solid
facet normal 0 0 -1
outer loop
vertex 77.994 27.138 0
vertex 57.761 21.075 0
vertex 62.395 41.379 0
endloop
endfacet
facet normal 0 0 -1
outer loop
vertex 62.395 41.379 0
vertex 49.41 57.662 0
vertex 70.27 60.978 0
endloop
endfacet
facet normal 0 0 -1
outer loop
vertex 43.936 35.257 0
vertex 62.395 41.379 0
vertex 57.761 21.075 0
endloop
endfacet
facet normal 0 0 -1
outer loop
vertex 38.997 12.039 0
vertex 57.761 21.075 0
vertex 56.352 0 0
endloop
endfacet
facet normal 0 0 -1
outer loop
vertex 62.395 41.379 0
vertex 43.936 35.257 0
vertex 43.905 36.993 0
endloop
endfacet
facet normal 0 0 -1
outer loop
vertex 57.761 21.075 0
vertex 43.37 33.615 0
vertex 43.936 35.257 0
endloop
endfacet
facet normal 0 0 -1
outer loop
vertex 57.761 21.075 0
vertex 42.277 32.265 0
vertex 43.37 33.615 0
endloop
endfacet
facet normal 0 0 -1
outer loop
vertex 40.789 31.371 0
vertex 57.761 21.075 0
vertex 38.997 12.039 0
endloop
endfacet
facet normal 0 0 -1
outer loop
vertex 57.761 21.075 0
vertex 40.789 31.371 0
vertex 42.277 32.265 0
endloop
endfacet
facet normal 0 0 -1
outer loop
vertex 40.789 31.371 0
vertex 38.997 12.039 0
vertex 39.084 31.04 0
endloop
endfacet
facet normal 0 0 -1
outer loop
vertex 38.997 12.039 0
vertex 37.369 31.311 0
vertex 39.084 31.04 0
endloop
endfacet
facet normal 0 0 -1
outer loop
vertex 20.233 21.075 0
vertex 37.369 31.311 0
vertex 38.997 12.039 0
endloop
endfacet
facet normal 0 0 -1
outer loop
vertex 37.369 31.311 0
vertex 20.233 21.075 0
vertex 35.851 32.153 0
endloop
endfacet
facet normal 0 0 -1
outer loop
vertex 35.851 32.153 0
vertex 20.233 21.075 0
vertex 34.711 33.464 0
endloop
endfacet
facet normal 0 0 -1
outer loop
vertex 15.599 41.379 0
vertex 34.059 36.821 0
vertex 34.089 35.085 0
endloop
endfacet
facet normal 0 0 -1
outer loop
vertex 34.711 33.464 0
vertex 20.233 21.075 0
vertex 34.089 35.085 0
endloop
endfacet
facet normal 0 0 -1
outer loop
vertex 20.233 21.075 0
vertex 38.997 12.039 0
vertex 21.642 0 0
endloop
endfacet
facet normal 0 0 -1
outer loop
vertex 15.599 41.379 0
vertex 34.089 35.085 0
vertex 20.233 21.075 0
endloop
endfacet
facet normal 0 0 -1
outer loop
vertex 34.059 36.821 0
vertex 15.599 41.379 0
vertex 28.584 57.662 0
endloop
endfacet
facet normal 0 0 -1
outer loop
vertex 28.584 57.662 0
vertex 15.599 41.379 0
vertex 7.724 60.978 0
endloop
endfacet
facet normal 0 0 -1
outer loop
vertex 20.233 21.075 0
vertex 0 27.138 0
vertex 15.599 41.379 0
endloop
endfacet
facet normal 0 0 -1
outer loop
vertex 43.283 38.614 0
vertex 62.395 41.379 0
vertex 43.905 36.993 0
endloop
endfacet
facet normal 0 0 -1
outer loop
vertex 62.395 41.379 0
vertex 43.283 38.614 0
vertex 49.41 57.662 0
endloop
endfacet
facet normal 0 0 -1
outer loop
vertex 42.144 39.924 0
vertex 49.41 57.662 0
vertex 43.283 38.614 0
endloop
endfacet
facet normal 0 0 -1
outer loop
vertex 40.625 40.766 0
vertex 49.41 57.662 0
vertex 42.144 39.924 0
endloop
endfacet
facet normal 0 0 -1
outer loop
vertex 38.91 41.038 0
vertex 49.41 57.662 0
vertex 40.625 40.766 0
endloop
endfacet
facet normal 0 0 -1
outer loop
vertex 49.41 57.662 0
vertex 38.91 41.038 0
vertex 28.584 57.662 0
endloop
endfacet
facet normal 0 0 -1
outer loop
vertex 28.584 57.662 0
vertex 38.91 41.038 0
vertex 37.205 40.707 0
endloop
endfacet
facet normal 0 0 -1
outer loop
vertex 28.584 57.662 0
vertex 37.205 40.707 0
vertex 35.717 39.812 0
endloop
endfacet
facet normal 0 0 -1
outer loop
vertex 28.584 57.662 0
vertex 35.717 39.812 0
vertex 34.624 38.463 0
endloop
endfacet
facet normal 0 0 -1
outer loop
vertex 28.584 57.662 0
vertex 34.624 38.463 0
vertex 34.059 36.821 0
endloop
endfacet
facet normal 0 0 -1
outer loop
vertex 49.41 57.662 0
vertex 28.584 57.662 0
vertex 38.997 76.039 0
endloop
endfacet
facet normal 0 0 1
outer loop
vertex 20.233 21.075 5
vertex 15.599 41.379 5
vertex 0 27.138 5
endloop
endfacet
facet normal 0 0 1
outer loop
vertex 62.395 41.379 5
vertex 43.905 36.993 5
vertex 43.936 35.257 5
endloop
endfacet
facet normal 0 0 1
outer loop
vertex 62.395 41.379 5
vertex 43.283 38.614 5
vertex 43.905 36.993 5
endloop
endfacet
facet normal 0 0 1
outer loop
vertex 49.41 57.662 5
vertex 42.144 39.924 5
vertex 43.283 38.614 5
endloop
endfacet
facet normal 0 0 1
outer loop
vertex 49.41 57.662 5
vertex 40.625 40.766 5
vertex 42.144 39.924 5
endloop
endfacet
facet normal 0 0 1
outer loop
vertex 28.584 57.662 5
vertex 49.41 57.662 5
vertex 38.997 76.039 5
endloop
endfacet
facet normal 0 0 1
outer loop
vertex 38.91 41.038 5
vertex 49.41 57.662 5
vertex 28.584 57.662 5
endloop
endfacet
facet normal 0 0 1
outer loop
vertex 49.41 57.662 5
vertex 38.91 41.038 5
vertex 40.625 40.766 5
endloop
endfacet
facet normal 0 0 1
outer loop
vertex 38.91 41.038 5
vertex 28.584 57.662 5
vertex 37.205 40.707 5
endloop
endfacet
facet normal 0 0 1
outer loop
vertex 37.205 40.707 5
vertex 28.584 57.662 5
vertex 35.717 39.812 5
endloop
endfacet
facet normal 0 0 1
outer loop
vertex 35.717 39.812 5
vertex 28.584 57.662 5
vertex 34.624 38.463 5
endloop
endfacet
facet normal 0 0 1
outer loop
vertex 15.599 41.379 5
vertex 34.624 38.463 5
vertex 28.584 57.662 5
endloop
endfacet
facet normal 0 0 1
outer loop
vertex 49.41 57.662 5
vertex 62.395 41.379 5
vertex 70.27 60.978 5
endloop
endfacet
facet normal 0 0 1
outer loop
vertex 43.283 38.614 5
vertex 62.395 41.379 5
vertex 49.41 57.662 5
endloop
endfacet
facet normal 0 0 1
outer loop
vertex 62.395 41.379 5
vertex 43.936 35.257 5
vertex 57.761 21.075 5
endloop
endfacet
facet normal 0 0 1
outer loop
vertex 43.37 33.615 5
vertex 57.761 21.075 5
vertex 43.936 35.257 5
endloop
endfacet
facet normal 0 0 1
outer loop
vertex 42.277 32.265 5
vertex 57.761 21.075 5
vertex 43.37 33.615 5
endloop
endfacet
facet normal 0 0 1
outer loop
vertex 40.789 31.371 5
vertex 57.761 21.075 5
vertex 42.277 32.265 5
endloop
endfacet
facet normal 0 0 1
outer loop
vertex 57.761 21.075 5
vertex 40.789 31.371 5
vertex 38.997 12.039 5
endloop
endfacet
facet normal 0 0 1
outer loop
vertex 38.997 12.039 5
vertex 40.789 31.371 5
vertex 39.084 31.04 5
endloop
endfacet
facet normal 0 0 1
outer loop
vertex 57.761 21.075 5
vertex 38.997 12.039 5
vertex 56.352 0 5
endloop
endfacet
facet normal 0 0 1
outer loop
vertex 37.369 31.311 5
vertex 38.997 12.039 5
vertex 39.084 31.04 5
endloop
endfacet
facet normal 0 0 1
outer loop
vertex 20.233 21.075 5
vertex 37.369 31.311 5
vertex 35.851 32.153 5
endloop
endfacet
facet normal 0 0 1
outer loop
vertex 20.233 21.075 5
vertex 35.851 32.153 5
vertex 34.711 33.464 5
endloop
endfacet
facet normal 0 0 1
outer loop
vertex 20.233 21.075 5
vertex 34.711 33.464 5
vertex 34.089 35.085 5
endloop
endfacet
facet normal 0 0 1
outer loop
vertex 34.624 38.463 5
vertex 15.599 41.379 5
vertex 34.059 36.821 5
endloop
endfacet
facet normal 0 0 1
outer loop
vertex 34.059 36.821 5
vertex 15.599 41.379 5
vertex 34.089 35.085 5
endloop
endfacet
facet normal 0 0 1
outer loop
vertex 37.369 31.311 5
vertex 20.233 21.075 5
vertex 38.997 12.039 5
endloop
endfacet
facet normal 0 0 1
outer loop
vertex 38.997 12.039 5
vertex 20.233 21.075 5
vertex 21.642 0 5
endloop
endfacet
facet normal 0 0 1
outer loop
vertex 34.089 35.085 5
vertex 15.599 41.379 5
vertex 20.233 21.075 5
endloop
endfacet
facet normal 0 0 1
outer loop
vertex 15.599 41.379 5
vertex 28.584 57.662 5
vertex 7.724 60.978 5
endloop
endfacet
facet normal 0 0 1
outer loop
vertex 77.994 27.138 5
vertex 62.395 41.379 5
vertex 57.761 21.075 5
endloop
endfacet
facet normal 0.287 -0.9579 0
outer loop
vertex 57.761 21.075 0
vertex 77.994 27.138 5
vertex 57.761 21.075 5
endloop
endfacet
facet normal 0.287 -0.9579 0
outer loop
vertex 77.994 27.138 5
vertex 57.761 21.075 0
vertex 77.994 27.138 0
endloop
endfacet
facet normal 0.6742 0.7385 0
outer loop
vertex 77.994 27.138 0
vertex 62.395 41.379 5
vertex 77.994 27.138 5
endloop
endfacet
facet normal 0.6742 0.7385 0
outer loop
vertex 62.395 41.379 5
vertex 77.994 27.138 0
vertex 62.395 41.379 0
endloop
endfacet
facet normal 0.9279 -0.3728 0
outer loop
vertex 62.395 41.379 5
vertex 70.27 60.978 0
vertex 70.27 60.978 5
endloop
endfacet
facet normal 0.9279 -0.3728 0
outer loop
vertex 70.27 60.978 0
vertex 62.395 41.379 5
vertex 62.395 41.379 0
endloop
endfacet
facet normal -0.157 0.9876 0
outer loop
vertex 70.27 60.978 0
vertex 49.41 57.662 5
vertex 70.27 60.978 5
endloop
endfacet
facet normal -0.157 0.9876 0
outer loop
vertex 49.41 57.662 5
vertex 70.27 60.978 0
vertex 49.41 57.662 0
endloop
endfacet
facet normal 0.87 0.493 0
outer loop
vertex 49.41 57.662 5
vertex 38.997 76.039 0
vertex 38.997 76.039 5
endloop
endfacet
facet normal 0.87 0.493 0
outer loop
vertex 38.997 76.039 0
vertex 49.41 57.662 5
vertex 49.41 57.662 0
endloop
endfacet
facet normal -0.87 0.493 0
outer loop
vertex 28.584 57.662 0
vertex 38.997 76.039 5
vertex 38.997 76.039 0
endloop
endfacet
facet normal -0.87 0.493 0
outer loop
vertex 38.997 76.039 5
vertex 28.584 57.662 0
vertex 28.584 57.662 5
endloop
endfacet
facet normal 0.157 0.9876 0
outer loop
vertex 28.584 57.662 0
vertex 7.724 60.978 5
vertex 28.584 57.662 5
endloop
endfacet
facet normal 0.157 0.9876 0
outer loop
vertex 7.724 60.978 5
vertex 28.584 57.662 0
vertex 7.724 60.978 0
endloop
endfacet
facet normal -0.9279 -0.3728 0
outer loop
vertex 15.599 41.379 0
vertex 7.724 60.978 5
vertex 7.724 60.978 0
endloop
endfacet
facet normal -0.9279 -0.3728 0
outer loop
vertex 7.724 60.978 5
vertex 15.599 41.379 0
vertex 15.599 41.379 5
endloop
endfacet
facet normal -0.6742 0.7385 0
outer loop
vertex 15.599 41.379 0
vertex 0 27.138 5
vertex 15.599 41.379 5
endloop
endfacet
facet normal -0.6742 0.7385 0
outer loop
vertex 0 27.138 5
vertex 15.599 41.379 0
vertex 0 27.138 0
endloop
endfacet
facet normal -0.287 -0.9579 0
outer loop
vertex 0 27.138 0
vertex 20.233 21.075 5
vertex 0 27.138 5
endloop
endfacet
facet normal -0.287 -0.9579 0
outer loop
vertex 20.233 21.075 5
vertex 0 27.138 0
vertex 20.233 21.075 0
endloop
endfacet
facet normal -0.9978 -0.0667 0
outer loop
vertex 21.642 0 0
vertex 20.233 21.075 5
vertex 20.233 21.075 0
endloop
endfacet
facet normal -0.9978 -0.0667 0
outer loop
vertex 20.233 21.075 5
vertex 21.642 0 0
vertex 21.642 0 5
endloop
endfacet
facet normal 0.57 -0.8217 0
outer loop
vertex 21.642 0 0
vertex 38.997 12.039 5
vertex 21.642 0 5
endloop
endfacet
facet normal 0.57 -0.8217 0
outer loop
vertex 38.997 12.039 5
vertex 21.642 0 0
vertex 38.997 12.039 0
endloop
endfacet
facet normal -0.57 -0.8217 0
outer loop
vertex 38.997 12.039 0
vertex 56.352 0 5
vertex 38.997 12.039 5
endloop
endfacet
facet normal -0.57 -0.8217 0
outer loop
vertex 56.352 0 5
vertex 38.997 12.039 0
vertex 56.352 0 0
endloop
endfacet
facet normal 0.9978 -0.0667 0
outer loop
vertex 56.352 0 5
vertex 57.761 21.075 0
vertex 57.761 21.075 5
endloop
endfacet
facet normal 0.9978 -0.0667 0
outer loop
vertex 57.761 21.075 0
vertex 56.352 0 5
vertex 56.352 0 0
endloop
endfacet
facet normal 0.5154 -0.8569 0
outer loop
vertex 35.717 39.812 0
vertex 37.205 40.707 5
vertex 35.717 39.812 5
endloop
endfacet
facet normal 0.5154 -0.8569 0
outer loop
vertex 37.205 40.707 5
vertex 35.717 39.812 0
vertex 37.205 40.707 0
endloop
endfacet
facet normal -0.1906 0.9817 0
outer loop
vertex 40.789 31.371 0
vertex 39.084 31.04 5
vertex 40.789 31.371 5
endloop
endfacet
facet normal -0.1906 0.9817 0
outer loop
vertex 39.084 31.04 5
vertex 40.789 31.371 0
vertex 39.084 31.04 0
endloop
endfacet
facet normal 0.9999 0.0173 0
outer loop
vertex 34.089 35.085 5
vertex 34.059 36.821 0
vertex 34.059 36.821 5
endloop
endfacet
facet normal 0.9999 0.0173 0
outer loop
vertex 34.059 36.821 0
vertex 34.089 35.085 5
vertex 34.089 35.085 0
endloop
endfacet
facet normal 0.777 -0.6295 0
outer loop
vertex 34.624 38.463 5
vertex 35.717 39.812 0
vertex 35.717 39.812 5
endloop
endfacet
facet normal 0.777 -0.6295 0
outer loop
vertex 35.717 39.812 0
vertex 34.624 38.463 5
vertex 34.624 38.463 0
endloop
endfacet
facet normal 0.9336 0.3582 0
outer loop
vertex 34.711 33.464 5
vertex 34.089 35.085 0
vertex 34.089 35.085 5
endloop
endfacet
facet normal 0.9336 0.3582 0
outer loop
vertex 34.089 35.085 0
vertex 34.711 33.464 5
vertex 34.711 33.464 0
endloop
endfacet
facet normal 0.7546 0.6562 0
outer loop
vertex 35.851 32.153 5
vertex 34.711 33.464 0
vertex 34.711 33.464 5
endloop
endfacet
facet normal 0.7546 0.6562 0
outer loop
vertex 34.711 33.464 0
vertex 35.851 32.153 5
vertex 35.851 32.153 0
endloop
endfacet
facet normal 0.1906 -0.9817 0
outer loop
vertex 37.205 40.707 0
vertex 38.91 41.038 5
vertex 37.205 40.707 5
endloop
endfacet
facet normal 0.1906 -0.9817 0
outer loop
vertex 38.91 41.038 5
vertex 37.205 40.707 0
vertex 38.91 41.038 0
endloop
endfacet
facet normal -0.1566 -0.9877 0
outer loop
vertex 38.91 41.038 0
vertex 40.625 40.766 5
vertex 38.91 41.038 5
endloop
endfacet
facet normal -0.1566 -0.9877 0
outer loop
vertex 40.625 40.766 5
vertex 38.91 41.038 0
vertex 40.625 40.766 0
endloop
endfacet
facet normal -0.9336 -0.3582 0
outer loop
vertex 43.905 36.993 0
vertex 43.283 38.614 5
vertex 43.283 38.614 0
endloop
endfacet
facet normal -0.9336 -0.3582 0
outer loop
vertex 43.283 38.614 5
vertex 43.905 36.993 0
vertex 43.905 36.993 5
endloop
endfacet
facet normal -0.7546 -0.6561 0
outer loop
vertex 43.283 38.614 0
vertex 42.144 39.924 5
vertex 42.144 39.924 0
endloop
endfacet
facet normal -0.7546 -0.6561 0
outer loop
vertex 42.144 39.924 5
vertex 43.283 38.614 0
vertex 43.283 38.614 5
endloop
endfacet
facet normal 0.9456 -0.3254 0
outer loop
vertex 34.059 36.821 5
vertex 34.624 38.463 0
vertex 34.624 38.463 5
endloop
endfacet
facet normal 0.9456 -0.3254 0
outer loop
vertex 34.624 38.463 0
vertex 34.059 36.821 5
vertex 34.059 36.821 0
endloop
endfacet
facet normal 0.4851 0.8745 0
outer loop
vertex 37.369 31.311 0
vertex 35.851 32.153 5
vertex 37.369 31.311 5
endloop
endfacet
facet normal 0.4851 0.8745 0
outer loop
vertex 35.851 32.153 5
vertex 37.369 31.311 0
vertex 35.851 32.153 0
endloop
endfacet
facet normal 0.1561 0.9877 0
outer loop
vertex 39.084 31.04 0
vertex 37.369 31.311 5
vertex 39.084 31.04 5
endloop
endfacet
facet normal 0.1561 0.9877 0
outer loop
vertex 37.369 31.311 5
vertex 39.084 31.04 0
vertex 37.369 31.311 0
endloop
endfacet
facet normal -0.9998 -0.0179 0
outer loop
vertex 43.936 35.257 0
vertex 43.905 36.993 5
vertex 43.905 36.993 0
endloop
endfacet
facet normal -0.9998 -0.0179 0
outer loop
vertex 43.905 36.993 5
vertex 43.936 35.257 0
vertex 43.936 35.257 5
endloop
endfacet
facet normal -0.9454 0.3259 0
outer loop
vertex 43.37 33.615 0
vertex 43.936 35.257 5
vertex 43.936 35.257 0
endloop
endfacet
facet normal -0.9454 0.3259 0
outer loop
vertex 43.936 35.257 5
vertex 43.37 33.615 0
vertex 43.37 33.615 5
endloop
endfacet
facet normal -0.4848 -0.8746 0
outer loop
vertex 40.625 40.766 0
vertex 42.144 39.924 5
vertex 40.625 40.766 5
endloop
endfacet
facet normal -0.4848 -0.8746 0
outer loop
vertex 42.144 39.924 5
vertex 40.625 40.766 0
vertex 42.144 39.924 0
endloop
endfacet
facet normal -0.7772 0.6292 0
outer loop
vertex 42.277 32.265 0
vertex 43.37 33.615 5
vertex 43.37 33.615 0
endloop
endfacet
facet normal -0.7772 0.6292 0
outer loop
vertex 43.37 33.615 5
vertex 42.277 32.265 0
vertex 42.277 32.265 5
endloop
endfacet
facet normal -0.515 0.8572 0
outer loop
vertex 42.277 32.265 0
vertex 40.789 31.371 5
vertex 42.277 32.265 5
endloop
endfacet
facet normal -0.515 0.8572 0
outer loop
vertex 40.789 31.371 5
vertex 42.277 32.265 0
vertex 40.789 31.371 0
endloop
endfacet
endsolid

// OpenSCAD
$fn = 32;

// ----------------------------------------------------------------------
// Star wheel: 7-point blunt, R40
// ----------------------------------------------------------------------

// --- parameters (mm) ---
n_points = 7;             // number of points / teeth
r_out = 40;               // tip radius
r_in = 24;                // root radius
bore_r = 5;               // centre bore radius
plate_t = 5;              // plate thickness, Z (extrusion height)
bore_d = 10;              // centre bore diameter

profile = [[38.997, 76.039], [28.584, 57.662], [7.724, 60.978], [15.599, 41.379], [0, 27.138], [20.233, 21.075], [21.642, 0], [38.997, 12.039], [56.352, 0], [57.761, 21.075], [77.994, 27.138], [62.395, 41.379], [70.27, 60.978], [49.41, 57.662]];  // primary outline, 14 points, counter clockwise
void_1 = [[43.905, 36.993], [43.283, 38.614], [42.144, 39.924], [40.625, 40.766], [38.91, 41.038], [37.205, 40.707], [35.717, 39.812], [34.624, 38.463], [34.059, 36.821], [34.089, 35.085], [34.711, 33.464], [35.851, 32.153], [37.369, 31.311], [39.084, 31.04], [40.789, 31.371], [42.277, 32.265], [43.37, 33.615], [43.936, 35.257]];  // centre bore, 18 points

// --- the one profile operation ---
difference() {
  linear_extrude(height = plate_t) polygon(points = profile);
  translate([0, 0, -1])
    linear_extrude(height = plate_t + 2) polygon(points = void_1);
}
